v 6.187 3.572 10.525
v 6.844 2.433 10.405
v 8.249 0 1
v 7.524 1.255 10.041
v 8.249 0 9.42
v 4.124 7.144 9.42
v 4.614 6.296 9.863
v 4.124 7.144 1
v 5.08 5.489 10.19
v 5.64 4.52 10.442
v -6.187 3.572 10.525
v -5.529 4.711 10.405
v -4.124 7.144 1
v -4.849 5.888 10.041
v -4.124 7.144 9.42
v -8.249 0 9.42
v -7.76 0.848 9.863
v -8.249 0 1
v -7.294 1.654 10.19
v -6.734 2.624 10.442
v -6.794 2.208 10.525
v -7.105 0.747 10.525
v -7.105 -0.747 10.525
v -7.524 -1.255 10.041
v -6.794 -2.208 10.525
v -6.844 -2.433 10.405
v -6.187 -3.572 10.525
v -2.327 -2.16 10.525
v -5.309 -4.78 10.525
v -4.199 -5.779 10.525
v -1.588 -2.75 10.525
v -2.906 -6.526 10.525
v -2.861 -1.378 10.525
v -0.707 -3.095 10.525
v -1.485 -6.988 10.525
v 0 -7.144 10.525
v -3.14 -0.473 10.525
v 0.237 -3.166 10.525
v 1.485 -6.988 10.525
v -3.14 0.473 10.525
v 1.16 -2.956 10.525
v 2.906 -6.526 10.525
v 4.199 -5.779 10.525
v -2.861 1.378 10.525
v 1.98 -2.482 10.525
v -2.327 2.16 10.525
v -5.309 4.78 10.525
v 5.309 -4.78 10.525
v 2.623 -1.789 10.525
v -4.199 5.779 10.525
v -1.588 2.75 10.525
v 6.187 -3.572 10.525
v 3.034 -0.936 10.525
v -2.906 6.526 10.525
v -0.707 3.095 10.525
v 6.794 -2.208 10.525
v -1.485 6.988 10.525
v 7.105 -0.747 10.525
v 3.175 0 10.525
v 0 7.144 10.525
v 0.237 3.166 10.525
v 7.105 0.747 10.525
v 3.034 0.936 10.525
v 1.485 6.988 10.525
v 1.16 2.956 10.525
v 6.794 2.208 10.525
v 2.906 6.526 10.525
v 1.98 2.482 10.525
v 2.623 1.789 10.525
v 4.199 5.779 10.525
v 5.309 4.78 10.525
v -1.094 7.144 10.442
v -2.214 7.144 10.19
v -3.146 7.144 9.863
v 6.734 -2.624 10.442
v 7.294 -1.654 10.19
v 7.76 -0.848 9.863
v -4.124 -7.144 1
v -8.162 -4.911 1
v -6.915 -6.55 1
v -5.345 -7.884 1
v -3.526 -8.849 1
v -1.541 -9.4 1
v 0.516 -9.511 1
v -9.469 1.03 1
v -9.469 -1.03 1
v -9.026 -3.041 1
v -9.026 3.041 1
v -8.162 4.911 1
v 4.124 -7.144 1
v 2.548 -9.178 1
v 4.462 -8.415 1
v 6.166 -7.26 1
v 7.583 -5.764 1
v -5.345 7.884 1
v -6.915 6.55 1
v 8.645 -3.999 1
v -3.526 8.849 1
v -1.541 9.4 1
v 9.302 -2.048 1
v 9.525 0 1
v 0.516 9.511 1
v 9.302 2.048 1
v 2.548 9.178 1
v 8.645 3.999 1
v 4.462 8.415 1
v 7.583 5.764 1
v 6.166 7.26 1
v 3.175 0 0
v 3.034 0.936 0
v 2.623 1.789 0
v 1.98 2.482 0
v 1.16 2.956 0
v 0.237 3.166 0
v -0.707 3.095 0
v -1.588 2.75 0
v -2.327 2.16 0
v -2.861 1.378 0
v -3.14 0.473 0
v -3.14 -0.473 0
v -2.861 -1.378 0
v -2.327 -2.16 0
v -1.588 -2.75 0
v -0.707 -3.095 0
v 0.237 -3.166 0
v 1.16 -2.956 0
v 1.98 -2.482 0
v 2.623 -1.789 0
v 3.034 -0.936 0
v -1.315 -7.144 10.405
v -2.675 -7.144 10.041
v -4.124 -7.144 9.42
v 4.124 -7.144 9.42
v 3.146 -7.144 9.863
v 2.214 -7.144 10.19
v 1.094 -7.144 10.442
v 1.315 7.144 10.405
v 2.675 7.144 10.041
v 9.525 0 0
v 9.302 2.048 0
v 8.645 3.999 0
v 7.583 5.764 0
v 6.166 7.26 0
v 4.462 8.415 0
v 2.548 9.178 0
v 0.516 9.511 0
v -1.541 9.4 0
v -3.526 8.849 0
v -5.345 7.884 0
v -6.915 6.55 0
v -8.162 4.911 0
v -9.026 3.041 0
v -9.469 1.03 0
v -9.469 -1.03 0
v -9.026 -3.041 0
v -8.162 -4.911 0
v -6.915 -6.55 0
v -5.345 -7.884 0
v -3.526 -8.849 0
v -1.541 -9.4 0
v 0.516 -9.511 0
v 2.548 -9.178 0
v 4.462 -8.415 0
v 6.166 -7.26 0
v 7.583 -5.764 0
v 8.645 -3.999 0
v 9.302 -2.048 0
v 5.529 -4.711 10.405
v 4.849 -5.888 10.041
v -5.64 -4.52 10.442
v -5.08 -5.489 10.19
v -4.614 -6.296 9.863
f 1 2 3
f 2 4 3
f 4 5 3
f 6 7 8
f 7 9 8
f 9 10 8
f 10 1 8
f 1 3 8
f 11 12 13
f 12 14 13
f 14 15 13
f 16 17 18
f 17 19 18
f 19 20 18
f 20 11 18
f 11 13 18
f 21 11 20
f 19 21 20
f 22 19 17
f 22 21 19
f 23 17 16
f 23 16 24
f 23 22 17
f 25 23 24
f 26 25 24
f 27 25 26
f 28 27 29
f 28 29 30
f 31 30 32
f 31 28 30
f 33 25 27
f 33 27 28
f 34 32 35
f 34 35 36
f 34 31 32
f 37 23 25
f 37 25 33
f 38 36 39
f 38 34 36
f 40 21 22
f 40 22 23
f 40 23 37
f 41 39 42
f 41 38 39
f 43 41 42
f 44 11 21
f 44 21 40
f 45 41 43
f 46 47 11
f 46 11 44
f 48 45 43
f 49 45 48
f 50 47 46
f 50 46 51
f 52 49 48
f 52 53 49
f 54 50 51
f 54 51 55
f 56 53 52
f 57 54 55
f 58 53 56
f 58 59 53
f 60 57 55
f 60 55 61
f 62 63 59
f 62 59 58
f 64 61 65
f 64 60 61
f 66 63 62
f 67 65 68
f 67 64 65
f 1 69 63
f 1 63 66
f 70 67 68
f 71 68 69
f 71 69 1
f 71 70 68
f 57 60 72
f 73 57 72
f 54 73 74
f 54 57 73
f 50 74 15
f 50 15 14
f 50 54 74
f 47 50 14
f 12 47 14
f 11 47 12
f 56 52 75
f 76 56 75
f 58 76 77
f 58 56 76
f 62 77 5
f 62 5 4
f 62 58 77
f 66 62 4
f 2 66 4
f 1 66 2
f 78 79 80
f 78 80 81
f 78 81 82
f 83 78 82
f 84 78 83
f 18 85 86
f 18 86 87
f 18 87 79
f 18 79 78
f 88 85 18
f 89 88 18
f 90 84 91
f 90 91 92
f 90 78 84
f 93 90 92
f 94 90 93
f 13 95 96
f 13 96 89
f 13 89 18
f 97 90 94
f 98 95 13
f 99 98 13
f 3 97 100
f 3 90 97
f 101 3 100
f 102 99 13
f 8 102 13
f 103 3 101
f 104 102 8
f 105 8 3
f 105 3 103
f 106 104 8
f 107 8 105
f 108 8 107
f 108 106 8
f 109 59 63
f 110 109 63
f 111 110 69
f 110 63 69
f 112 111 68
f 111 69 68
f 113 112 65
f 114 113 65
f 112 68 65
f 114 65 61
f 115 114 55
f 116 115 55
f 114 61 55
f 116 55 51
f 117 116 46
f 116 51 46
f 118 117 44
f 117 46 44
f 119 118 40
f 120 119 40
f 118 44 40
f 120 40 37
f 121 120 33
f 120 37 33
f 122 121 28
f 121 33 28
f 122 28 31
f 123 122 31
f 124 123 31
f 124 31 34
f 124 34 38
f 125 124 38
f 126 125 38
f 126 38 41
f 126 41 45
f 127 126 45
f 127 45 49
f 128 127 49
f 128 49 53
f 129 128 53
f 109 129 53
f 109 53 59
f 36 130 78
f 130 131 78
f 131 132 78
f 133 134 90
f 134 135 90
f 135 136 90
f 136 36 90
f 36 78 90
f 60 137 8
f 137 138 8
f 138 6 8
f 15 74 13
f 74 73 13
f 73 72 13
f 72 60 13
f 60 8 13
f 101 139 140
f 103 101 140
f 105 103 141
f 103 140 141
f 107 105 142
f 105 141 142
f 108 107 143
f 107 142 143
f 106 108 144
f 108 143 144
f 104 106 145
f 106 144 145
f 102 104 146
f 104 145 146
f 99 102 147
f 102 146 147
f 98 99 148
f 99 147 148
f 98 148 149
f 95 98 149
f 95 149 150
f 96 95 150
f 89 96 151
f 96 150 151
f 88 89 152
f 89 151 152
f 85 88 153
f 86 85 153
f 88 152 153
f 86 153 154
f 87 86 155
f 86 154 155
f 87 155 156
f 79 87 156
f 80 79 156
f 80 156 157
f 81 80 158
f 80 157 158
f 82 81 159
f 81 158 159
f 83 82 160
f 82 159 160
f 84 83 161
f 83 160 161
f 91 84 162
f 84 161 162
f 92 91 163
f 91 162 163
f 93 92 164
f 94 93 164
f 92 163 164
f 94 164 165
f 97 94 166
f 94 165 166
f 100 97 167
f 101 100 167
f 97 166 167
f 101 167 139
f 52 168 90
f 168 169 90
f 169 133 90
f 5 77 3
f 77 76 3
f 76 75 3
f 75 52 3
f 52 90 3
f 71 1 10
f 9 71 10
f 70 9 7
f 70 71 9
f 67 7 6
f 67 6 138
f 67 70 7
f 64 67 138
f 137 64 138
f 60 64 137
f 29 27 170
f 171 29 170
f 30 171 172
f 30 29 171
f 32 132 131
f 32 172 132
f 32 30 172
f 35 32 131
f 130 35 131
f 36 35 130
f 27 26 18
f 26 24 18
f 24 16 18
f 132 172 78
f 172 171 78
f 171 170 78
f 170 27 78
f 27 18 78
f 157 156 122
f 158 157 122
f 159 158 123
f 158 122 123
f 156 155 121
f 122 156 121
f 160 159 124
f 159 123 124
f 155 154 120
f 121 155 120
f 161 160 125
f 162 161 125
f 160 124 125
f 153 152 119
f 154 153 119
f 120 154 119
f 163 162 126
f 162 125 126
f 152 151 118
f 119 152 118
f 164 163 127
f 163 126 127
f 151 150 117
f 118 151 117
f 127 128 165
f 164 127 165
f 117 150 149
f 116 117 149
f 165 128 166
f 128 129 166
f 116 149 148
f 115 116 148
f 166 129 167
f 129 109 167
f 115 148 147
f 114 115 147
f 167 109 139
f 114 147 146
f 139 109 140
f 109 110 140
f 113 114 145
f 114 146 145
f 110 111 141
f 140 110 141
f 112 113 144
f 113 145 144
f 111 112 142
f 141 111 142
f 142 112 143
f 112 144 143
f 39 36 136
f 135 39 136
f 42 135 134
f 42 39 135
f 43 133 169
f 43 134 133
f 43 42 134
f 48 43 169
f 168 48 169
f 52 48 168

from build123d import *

# Parameters (mm, degrees)
SKETCH1_R           = 9.525
BOSS_EXTRUDE1_DEPTH = 1
BOSS_EXTRUDE2_DEPTH = 9.525
SKETCH3_R           = 3.175
CUT_EXTRUDE1_DEPTH  = 18.094644629
SKETCH4_OUTSIDE_W   = 45.884
SKETCH4_OUTSIDE_H   = 45.884
SKETCH4_OUTSIDE_R   = 7.14375
CUT_EXTRUDE2_DEPTH  = 9.525
CUT_EXTRUDE2_DRAFT  = -45


with BuildPart() as part:
    # Sketch1 → Boss-Extrude1 (new body)
    with BuildSketch(Plane.XY):
        Circle(SKETCH1_R)
    extrude(amount=BOSS_EXTRUDE1_DEPTH)

    # Sketch2 → Boss-Extrude2 (add)
    with BuildSketch(Plane.XY.offset(1)):
        Polygon((4.124445986, -7.14375), (8.248891971, 0), (4.124445986, 7.14375), (-4.124445986, 7.14375), (-8.248891971, 0), (-4.124445986, -7.14375), align=None)
    extrude(amount=BOSS_EXTRUDE2_DEPTH)

    # Sketch3 → Cut-Extrude1 (cut, through all)
    with BuildSketch(Plane.XY.offset(10.525)):
        Circle(SKETCH3_R)
    extrude(amount=-CUT_EXTRUDE1_DEPTH, mode=Mode.SUBTRACT)


with BuildPart() as cut_extrude2_tool:
    # Sketch4 outside → Cut-Extrude2 (with draft: the straight prism first)
    with BuildSketch(Plane.XY.offset(10.525)):
        Rectangle(SKETCH4_OUTSIDE_W, SKETCH4_OUTSIDE_H)
        Circle(SKETCH4_OUTSIDE_R, mode=Mode.SUBTRACT)
    extrude(amount=-CUT_EXTRUDE2_DEPTH)
    # Cut-Extrude2: the draft: its side faces are tilted about the plane it starts from
    cut_extrude2_sides = [cut_extrude2_tool.faces().sort_by_distance(p)[0] for p in [
        (0, -22.942, 5.7625),
        (22.942, 0, 5.7625),
        (0, 22.942, 5.7625),
        (-22.942, 0, 5.7625),
        (-7.14375, 0, 5.7625),
    ]]
    draft(cut_extrude2_sides, Plane.XY.offset(10.525), CUT_EXTRUDE2_DRAFT)


with BuildPart() as part_1:
    add(part.part)

    # Cut-Extrude2: cut by cut_extrude2_tool
    add(cut_extrude2_tool.part, mode=Mode.SUBTRACT)


solid = part_1.part
